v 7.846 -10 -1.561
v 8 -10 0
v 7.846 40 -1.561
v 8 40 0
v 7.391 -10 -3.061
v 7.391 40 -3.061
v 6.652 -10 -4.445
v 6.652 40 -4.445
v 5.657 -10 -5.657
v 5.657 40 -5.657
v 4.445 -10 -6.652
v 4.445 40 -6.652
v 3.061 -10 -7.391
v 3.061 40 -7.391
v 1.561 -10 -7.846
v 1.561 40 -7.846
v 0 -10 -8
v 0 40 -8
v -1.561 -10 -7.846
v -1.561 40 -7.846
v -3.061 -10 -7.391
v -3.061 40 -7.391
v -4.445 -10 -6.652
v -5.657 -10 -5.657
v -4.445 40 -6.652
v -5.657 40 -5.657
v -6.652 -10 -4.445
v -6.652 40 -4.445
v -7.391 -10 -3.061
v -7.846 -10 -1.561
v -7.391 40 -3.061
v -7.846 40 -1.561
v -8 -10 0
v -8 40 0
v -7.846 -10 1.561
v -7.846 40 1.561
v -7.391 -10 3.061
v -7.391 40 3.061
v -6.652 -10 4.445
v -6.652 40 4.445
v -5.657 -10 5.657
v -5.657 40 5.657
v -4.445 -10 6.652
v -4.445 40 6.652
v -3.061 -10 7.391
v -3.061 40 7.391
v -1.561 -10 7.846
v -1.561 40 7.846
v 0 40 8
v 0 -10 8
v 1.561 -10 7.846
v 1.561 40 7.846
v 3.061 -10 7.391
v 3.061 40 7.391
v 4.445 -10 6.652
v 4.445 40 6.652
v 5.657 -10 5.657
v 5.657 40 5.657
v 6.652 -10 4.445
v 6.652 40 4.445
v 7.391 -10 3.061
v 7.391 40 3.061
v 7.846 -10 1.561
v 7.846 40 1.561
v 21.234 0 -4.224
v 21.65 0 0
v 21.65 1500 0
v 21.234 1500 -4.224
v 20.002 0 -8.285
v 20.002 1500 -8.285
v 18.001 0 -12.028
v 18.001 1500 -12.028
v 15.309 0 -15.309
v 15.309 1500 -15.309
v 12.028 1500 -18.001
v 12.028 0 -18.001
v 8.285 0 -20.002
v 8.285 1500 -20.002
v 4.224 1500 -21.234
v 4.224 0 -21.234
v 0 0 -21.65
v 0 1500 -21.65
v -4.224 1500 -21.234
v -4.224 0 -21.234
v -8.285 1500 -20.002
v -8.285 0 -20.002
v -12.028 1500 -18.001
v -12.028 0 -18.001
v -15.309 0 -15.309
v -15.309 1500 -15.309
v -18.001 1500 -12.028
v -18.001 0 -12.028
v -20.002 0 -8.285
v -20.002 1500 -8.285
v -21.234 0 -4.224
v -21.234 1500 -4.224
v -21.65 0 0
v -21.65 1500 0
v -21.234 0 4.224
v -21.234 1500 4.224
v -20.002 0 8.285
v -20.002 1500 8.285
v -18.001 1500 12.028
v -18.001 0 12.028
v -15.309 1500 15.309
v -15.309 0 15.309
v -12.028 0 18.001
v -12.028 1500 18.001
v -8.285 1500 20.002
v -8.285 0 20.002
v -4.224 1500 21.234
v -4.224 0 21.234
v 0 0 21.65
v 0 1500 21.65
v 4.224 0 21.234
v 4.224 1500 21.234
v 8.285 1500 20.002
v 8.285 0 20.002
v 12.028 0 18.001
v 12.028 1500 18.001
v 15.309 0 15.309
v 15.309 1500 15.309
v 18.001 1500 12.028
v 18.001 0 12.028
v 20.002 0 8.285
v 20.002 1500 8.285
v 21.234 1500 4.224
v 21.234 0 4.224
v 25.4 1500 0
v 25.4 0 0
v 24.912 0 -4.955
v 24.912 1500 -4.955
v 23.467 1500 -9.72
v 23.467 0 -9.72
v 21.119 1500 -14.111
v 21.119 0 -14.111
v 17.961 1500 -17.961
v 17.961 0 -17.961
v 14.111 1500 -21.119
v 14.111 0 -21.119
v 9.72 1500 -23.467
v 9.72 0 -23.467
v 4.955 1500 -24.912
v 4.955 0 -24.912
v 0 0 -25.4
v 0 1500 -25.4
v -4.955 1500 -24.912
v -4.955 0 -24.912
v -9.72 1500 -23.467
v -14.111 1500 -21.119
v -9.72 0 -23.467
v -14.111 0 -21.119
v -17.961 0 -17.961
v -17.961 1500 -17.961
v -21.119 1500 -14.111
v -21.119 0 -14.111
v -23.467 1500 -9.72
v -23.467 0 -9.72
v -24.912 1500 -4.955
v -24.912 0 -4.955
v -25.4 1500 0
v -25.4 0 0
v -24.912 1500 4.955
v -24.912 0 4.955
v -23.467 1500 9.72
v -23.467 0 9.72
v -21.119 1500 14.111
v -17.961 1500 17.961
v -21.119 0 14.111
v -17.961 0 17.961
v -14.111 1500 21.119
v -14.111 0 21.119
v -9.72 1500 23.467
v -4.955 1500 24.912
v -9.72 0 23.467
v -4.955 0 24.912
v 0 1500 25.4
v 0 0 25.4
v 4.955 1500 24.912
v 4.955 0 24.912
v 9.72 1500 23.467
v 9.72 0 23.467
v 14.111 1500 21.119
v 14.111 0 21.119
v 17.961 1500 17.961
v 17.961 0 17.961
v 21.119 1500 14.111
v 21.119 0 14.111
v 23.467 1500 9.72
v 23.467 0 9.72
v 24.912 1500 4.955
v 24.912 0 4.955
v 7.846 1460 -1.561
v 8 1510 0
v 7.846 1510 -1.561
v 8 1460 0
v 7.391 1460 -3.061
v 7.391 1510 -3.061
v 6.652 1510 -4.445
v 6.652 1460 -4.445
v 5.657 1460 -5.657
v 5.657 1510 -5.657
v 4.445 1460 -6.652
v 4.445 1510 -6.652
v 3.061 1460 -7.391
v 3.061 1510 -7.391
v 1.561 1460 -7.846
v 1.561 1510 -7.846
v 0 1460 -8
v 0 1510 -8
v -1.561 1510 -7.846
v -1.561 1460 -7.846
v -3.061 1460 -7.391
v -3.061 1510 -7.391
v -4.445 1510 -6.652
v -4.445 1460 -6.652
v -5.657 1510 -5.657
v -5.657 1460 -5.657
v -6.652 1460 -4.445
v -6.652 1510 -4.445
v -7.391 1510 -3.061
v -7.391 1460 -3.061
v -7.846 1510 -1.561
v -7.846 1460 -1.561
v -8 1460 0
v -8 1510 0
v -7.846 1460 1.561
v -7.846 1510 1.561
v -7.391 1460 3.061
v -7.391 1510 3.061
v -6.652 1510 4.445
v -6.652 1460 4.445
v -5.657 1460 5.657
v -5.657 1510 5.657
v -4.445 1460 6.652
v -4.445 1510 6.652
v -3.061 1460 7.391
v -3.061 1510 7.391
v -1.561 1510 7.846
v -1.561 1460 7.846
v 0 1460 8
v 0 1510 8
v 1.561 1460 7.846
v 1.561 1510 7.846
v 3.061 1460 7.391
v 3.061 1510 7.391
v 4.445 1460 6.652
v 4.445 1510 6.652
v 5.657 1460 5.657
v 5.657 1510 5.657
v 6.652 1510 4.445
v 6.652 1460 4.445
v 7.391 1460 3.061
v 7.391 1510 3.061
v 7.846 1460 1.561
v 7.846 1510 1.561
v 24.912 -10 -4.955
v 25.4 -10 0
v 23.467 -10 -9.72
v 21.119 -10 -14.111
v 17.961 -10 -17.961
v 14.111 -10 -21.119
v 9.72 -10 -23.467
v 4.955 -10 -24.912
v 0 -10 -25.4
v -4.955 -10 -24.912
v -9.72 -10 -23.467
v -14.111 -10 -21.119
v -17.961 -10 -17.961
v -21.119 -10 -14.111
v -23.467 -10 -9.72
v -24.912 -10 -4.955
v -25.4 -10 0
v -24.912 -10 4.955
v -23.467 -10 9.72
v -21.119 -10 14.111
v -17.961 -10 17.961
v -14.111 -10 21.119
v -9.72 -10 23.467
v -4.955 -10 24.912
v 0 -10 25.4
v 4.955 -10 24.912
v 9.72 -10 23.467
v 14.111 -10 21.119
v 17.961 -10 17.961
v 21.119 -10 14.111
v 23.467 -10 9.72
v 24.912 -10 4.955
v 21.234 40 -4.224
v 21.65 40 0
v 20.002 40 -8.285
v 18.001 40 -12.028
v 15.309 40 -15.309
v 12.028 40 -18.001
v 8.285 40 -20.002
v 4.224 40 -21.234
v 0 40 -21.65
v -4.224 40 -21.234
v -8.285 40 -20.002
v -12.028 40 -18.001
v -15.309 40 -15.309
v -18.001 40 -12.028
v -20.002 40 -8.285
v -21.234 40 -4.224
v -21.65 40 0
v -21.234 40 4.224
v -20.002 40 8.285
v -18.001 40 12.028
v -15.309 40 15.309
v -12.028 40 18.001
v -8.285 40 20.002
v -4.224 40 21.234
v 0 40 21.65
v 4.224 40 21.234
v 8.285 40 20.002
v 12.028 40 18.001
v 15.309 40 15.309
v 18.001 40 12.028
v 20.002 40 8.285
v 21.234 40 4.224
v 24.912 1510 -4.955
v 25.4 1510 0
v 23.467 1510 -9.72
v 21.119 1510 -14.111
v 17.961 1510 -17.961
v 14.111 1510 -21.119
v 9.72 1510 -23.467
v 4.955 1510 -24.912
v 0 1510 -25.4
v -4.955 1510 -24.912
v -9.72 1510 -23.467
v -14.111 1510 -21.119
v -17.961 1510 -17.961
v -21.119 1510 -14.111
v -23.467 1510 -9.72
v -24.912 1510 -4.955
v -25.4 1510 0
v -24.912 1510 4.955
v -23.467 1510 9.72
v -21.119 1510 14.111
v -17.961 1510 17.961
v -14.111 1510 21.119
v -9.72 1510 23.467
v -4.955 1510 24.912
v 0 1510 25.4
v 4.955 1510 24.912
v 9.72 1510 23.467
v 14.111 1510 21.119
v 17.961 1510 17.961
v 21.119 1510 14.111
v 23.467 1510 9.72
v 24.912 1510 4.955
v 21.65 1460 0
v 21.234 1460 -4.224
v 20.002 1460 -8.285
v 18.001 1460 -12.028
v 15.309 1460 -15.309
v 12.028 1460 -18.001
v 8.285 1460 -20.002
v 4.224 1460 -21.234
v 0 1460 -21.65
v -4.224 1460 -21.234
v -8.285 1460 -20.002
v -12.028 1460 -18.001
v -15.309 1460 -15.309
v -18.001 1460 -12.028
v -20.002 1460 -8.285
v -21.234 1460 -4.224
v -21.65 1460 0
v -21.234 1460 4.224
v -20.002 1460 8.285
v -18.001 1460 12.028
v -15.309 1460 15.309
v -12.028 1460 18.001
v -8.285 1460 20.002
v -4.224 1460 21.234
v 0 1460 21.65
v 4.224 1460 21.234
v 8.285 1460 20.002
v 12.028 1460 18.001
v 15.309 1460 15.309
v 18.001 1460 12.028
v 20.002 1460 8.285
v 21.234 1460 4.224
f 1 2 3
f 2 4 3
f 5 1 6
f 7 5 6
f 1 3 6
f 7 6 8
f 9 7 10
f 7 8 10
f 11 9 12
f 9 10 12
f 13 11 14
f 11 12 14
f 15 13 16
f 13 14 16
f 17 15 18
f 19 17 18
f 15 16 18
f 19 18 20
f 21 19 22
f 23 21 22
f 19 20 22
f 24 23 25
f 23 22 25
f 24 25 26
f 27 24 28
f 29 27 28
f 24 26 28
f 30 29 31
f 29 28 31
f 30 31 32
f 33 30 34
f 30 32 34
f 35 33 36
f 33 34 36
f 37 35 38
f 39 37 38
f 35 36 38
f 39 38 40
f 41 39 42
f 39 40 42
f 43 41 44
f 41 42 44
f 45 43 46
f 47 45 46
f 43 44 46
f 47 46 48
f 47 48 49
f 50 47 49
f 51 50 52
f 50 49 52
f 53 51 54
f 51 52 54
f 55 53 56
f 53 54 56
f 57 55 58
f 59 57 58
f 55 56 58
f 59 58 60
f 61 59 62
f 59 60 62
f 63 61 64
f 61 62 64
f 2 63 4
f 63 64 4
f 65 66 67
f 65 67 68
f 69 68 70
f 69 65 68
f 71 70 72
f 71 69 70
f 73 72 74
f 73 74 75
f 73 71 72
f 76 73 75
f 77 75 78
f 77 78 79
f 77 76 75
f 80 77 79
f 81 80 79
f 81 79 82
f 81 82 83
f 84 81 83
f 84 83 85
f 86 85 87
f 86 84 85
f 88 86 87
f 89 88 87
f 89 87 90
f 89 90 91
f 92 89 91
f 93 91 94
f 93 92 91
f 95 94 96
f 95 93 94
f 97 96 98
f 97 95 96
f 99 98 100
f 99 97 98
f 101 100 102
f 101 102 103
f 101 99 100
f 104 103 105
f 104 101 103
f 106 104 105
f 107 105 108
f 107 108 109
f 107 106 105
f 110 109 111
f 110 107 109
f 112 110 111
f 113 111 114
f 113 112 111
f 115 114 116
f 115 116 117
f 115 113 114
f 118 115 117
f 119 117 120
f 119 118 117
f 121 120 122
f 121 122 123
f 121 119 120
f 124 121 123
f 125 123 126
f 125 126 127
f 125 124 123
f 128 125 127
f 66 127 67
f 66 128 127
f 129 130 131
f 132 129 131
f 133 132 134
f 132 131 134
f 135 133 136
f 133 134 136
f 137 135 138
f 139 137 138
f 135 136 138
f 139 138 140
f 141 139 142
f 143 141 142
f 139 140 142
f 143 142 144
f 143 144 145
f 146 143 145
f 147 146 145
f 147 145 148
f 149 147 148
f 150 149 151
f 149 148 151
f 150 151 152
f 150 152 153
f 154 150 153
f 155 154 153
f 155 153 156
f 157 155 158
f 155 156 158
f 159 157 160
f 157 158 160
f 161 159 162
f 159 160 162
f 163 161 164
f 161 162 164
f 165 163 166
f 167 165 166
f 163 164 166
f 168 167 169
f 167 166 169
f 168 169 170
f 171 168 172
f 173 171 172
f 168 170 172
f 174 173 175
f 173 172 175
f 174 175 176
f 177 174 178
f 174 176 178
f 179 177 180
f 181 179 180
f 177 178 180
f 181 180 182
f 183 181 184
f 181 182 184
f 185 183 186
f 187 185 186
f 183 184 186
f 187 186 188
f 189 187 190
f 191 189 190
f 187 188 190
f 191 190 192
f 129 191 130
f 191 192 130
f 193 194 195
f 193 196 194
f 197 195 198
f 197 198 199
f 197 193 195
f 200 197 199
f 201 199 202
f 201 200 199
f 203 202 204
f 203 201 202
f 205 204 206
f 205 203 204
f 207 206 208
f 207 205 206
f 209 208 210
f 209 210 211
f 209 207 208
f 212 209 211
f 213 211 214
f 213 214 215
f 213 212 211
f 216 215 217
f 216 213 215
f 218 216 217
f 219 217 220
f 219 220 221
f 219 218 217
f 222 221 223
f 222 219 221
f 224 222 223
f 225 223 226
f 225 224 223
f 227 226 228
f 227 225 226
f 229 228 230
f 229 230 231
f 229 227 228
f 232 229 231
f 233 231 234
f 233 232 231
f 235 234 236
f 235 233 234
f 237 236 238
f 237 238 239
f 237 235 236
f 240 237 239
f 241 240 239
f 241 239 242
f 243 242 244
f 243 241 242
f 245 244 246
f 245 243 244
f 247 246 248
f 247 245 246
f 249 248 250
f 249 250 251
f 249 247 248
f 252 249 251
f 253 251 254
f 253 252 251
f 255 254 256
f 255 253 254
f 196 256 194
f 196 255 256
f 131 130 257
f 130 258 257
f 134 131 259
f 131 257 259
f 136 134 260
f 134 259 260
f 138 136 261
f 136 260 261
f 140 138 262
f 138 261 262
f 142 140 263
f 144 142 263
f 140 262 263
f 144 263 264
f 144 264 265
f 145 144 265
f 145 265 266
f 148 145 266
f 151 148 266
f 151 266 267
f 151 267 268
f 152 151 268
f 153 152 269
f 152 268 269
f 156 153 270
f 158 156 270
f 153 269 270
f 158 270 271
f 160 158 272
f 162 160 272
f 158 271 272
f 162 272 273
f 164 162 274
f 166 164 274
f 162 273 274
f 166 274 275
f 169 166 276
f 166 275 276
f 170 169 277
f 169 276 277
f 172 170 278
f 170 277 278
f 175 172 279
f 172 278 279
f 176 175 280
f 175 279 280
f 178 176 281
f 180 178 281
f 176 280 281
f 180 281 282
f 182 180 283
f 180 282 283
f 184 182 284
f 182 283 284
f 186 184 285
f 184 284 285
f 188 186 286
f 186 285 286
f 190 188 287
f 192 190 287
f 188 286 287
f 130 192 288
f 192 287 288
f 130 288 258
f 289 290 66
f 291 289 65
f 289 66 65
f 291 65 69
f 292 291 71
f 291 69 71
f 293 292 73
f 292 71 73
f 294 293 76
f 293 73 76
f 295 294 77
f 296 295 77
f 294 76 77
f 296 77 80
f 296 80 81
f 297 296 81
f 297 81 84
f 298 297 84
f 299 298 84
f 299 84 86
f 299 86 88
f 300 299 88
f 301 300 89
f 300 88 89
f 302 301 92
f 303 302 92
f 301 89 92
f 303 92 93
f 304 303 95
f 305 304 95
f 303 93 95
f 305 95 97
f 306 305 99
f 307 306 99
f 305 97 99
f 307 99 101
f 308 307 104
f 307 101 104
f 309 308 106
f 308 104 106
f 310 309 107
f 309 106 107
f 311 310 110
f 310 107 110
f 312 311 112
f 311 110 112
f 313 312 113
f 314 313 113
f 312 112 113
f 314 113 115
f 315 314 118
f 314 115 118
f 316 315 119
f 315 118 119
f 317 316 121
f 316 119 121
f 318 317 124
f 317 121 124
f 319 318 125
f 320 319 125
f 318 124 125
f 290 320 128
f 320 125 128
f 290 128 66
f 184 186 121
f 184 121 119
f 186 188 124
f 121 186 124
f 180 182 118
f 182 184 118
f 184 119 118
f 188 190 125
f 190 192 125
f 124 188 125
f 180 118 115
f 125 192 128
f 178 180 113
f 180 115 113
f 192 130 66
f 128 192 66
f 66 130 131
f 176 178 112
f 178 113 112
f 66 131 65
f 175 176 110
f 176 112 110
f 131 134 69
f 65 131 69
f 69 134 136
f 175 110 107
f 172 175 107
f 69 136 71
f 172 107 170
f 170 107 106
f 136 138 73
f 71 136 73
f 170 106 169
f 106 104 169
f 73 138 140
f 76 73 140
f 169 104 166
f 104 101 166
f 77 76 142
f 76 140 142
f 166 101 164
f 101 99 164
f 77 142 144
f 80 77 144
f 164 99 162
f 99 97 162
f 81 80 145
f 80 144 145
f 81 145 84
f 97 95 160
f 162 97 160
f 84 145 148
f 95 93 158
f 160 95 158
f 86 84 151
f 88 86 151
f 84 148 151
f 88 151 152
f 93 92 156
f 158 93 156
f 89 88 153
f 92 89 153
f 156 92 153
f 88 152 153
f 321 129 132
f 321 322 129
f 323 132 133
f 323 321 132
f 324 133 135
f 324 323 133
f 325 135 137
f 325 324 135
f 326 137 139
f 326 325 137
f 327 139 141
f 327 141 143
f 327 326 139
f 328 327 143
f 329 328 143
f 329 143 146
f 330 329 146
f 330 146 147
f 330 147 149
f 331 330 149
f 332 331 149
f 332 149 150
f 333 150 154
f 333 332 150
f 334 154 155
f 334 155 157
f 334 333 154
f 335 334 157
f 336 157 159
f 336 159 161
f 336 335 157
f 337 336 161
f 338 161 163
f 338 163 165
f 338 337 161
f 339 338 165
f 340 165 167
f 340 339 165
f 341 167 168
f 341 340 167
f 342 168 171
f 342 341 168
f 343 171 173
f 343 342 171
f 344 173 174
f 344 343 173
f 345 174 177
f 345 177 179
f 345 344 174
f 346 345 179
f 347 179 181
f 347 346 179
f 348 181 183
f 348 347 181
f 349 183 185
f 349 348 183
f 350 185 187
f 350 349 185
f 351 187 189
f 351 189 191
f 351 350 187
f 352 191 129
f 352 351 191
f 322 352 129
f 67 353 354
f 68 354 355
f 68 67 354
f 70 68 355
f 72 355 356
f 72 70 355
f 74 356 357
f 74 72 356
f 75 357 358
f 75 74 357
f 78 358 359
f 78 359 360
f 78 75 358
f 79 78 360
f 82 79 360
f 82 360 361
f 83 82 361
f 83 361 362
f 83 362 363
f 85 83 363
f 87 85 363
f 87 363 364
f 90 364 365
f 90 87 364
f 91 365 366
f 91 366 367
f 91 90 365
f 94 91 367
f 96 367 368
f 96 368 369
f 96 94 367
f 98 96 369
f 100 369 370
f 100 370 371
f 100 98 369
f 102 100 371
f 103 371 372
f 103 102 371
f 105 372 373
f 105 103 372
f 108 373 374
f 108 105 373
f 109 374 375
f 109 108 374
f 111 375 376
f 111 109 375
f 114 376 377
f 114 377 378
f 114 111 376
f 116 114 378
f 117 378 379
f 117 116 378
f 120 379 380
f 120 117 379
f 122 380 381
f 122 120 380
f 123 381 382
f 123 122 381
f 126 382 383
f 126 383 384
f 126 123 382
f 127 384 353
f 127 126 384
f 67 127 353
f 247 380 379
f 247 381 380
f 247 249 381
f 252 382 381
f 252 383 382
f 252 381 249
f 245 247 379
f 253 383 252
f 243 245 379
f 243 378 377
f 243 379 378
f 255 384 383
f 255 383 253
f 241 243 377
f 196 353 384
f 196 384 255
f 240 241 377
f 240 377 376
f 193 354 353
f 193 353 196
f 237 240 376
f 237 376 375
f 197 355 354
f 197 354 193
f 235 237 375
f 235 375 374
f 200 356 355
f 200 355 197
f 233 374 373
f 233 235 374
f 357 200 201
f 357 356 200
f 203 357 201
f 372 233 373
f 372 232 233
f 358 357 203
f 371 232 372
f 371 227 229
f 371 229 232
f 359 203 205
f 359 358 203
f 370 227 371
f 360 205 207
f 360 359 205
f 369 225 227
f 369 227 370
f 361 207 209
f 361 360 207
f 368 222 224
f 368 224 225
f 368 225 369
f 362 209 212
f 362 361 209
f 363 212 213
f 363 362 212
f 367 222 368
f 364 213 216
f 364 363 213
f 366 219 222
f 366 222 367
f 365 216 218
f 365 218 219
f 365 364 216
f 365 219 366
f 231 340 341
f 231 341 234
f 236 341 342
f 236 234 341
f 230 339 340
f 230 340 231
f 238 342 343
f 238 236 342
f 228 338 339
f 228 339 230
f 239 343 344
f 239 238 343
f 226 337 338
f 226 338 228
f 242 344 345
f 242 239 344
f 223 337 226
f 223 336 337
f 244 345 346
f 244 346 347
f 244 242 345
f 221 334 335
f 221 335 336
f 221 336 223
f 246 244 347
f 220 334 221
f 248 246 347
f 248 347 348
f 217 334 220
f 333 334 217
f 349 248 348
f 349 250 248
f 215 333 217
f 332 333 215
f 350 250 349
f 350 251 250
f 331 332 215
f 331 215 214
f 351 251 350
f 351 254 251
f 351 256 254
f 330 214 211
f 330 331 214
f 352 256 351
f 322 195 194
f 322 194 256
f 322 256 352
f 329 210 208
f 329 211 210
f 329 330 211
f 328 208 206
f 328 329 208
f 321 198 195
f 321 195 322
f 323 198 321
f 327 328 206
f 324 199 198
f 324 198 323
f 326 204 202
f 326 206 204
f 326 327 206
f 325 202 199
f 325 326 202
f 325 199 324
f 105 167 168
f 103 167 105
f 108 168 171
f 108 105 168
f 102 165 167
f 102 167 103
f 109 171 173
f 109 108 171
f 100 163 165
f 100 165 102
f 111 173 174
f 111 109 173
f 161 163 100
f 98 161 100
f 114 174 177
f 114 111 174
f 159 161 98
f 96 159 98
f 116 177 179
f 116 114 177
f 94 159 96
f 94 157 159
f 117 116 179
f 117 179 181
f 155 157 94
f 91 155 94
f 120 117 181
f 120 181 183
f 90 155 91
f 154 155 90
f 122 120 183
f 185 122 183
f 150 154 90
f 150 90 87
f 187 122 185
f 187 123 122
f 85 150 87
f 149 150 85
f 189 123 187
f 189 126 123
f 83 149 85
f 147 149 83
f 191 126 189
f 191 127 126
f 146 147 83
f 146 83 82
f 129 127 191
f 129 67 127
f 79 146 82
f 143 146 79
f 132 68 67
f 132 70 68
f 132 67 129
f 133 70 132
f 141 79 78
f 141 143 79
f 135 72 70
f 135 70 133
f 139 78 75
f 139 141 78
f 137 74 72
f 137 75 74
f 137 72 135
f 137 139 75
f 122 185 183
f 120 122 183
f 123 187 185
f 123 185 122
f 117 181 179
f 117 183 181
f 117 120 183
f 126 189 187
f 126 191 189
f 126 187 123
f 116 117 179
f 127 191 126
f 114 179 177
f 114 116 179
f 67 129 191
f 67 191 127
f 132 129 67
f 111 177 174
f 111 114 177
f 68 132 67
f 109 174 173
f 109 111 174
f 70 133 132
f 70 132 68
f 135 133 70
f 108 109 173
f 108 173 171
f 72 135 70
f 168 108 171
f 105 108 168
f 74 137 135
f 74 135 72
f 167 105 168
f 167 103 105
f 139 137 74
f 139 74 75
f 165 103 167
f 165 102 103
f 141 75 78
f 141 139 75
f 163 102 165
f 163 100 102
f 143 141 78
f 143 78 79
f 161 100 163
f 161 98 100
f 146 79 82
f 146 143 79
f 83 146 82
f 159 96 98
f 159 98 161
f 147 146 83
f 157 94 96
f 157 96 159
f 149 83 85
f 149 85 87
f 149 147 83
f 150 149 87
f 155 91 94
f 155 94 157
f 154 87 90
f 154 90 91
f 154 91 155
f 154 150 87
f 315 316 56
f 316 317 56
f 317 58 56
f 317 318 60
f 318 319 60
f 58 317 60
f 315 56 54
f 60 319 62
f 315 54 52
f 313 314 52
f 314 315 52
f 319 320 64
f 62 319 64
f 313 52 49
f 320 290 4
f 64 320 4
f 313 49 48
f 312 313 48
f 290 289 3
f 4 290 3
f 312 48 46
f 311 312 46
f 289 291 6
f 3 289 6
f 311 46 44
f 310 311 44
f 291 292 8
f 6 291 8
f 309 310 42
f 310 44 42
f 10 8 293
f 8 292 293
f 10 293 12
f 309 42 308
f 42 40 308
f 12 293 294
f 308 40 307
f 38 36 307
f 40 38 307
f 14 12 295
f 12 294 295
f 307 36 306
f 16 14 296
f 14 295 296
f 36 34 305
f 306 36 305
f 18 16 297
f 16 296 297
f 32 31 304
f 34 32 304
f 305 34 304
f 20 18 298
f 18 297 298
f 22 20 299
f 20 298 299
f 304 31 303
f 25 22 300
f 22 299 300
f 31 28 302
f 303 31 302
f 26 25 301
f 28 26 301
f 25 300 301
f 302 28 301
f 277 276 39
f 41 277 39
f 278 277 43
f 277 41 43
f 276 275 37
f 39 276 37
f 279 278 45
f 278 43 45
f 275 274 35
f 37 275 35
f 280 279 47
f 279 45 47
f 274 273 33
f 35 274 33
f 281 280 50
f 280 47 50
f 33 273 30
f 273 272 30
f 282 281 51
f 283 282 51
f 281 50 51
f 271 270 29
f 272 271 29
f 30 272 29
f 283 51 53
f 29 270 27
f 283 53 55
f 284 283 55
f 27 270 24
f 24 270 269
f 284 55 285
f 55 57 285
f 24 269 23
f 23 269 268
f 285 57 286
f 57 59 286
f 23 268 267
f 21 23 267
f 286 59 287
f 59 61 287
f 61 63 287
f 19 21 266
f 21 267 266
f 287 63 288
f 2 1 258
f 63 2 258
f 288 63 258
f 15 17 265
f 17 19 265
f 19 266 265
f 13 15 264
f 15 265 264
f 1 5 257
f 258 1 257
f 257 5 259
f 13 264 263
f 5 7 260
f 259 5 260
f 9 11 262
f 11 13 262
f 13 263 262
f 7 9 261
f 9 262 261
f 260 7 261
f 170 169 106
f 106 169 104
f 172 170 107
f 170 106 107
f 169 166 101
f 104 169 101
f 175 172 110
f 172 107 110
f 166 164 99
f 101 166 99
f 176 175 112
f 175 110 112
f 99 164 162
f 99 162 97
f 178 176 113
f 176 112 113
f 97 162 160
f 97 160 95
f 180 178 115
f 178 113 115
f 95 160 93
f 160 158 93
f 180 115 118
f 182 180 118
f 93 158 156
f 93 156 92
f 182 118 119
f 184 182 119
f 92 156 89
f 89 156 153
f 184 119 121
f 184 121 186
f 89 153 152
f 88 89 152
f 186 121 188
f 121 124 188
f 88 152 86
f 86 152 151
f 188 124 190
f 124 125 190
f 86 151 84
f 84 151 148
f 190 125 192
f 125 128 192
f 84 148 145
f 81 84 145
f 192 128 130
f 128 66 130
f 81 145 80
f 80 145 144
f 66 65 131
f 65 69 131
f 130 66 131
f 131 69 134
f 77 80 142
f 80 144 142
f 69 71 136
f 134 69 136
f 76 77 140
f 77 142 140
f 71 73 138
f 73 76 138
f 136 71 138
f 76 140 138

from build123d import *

# Parameters (mm, degrees)
ESBO_O1_R                = 25.4
ESBO_O1_R_2              = 21.65
RESSALTO_EXTRUS_O1_DEPTH = 1500


with BuildPart() as part:
    # Esboço1 → Ressalto-extrusão1 (new body)
    with BuildSketch(Plane(origin=(0, 0, 0), x_dir=(1, 0, 0), z_dir=(0, 1, 0))):
        Circle(ESBO_O1_R)
        Circle(ESBO_O1_R_2, mode=Mode.SUBTRACT)
    extrude(amount=RESSALTO_EXTRUS_O1_DEPTH)


with BuildPart() as body_2:
    # Esboço2 → Revolução1 (revolve)
    with BuildSketch(Plane.XY):
        Polygon((25.4, 1500), (25.4, 1510), (8, 1510), (8, 1460), (21.65, 1460), (21.65, 1500), align=None)
        Polygon((8, -10), (8, 40), (21.65, 40), (21.65, 0), (25.4, 0), (25.4, -10), align=None)
    revolve(axis=Axis((0, 0, 0), (0, 1, 0)))


solid = Compound([part.part, body_2.part])
